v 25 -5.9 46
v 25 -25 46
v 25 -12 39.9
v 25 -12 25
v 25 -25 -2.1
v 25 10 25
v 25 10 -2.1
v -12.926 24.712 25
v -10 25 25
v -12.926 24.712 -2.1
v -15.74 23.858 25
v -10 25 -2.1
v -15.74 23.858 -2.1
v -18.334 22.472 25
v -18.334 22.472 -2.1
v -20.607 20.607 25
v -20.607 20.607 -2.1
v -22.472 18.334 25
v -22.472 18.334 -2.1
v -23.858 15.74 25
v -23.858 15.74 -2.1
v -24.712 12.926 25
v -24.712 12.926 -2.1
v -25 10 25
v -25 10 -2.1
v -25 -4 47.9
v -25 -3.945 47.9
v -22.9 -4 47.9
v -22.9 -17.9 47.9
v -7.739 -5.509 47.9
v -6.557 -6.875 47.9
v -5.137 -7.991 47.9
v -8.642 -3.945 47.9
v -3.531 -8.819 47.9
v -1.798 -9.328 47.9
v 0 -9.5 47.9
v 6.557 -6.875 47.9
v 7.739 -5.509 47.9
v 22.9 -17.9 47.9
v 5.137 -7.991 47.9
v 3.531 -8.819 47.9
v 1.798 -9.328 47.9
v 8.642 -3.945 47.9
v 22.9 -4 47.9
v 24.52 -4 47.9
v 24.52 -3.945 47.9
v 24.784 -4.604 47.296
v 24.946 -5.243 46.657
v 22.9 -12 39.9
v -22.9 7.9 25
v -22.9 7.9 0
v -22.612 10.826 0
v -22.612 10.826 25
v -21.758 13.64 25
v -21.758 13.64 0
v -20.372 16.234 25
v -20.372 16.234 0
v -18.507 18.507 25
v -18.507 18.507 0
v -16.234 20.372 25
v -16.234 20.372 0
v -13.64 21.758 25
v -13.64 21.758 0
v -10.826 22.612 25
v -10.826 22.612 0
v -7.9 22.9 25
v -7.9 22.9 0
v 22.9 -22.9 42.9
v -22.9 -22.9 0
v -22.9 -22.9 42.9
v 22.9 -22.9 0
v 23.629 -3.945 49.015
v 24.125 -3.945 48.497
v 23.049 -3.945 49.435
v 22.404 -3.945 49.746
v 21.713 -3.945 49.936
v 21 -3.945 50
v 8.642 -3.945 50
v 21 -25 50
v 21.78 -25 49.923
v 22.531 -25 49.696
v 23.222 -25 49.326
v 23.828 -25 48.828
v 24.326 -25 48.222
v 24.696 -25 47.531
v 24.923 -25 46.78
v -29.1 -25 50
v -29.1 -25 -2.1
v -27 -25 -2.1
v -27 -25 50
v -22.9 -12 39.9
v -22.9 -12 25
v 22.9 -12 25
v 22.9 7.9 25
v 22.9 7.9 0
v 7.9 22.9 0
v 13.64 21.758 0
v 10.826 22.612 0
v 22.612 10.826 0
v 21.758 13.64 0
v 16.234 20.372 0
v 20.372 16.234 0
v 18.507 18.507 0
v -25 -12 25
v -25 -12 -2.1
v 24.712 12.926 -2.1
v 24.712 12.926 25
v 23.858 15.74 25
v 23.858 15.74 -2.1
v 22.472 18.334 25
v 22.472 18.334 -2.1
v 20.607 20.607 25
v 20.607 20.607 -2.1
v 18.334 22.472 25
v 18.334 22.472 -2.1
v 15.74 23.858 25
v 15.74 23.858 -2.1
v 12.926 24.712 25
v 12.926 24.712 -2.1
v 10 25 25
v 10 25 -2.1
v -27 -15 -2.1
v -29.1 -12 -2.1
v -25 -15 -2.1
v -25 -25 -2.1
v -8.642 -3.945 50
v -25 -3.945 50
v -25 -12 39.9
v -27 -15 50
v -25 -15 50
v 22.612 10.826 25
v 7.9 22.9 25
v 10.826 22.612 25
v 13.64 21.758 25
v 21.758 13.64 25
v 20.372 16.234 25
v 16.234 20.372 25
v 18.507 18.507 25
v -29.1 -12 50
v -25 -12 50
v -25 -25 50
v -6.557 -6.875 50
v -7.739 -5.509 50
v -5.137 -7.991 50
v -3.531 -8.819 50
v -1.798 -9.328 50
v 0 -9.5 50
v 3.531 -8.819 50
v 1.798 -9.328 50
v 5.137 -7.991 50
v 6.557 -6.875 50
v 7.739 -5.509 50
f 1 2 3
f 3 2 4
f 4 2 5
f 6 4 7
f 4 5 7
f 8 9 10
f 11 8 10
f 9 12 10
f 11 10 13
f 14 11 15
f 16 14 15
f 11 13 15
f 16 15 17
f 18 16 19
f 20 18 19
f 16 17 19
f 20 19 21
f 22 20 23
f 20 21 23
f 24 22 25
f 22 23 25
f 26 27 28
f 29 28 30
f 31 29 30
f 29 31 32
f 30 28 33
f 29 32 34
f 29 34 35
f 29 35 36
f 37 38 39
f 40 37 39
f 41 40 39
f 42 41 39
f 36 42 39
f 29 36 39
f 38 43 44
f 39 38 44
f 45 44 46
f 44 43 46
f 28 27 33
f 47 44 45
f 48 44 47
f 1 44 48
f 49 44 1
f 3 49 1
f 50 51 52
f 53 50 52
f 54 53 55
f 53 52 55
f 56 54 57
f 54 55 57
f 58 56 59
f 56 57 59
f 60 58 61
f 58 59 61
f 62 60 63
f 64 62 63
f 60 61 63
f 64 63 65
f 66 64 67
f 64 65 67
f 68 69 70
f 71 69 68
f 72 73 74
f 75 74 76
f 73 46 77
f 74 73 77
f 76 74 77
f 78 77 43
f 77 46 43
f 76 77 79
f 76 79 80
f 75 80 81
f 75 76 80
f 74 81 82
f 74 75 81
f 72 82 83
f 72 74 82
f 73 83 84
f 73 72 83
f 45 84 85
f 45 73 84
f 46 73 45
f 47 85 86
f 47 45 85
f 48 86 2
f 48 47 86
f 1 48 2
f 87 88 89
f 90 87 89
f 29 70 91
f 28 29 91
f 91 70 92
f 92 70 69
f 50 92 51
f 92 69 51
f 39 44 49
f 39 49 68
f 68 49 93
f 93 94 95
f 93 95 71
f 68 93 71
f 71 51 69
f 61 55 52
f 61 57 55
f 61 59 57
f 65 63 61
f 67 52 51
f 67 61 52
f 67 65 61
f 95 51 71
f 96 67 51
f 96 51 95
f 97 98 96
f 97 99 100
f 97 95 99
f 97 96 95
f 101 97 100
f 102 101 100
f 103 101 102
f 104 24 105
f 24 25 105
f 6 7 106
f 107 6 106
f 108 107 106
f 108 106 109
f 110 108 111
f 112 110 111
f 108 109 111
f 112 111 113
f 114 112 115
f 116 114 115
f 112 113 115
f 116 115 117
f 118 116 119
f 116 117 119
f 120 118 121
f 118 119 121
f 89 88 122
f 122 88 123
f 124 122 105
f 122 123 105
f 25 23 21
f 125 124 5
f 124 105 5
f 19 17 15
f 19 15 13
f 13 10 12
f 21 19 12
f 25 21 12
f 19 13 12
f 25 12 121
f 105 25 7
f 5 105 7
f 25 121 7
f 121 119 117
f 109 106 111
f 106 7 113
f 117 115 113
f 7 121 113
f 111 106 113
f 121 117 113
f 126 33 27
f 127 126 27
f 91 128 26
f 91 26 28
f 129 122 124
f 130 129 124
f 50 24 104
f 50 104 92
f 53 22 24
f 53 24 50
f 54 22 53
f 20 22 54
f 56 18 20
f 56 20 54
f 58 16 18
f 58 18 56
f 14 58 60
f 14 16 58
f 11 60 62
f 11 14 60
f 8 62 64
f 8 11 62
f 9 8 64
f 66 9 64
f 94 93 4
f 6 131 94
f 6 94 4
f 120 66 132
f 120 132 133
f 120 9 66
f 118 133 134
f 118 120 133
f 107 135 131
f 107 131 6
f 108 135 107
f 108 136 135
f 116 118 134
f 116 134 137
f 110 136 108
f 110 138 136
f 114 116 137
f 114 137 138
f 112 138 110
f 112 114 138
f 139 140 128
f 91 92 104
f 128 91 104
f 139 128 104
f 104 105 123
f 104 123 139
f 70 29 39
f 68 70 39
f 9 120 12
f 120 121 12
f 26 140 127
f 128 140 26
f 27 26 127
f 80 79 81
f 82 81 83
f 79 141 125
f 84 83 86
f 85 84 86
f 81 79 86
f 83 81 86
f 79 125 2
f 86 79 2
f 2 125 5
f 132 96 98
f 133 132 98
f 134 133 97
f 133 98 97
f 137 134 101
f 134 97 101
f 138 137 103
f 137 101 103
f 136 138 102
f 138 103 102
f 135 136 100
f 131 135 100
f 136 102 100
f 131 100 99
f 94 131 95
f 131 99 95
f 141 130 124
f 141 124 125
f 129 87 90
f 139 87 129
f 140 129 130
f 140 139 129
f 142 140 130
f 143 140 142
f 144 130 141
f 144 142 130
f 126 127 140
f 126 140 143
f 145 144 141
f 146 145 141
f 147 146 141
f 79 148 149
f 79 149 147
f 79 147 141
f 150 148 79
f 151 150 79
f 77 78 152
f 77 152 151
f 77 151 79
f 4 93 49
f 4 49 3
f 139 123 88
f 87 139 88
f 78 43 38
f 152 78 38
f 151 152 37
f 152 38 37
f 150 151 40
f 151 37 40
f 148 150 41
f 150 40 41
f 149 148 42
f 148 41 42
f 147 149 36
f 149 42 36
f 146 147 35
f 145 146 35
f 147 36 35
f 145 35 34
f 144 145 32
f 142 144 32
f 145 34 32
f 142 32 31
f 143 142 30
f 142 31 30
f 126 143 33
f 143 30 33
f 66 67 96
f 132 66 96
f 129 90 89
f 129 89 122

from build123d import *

# Parameters (mm, degrees)
F0_W          = 2.1
F0_H          = 8.055364
F0_H_2        = 10.9
F1_DEPTH      = 2.1
F2_DEPTH      = 50
F2_DEPTH_BACK = 2.1
F3_DEPTH      = 47.9
F4_SIZE       = 5
F5_DEPTH      = 25
F6_SIZE       = 8
F7_R          = 4


with BuildPart() as f1:
    # F0 (on Top) → F1 (new body)
    with BuildSketch(Plane.XY):
        with BuildLine():
            Line((8.642329, -3.944636), (22.9, -3.944636))
            Line((22.9, -3.944636), (22.9, 7.9))
            ThreePointArc((22.9, 7.9), (18.506602, 18.506602), (7.9, 22.9))
            Line((7.9, 22.9), (-7.9, 22.9))
            ThreePointArc((-7.9, 22.9), (-18.506602, 18.506602), (-22.9, 7.9))
            Line((-22.9, 7.9), (-22.9, -3.944636))
            Line((-22.9, -3.944636), (-8.642329, -3.944636))
            ThreePointArc((-8.642329, -3.944636), (-2.0184, 9.283106), (9.5, 0))
            ThreePointArc((9.5, 0), (9.283106, -2.0184), (8.642329, -3.944636))
        make_face()
        with BuildLine():
            Line((-22.9, -22.9), (22.9, -22.9))
            Line((22.9, -22.9), (22.9, -12))
            Line((22.9, -12), (22.9, -3.944636))
            Line((22.9, -3.944636), (8.642329, -3.944636))
            ThreePointArc((8.642329, -3.944636), (0, -9.5), (-8.642329, -3.944636))
            Line((-8.642329, -3.944636), (-22.9, -3.944636))
            Line((-22.9, -3.944636), (-22.9, -12))
            Line((-22.9, -12), (-22.9, -22.9))
        make_face()
        with BuildLine():
            ThreePointArc((-8.642329, -3.944636), (0, -9.5), (8.642329, -3.944636))
            Line((8.642329, -3.944636), (-8.642329, -3.944636))
        make_face()
        with BuildLine():
            Line((22.9, -3.944636), (25, -3.944636))
            Line((25, -3.944636), (25, 10))
            ThreePointArc((25, 10), (20.606602, 20.606602), (10, 25))
            Line((10, 25), (-10, 25))
            ThreePointArc((-10, 25), (-20.606602, 20.606602), (-25, 10))
            Line((-25, 10), (-25, -3.944636))
            Line((-25, -3.944636), (-22.9, -3.944636))
            Line((-22.9, -3.944636), (-22.9, 7.9))
            ThreePointArc((-22.9, 7.9), (-18.506602, 18.506602), (-7.9, 22.9))
            Line((-7.9, 22.9), (7.9, 22.9))
            ThreePointArc((7.9, 22.9), (18.506602, 18.506602), (22.9, 7.9))
            Line((22.9, 7.9), (22.9, -3.944636))
        make_face()
        with BuildLine():
            Line((-8.642329, -3.944636), (8.642329, -3.944636))
            ThreePointArc((8.642329, -3.944636), (9.283106, -2.0184), (9.5, 0))
            ThreePointArc((9.5, 0), (-2.0184, 9.283106), (-8.642329, -3.944636))
        make_face()
        Polygon((-25, -15), (-25, -22.9), (-22.9, -22.9), (-22.9, -12), (-25, -12), (-29.1, -12), (-29.1, -25), (-27, -25), (-27, -15), align=None)
        Polygon((-25, -25), (25, -25), (25, -22.9), (22.9, -22.9), (-22.9, -22.9), (-25, -22.9), align=None)
        with Locations((-23.95, -7.972318)):
            Rectangle(F0_W, F0_H)
        with Locations((23.95, -7.972318)):
            Rectangle(F0_W, F0_H)
        with Locations((23.95, -17.45)):
            Rectangle(F0_W, F0_H_2)
    extrude(amount=-F1_DEPTH)

    # F0 (on Top) → F2 (join, two sides)
    with BuildSketch(Plane.XY) as f2_sk:
        with BuildLine():
            Line((-22.9, -22.9), (22.9, -22.9))
            Line((22.9, -22.9), (22.9, -12))
            Line((22.9, -12), (22.9, -3.944636))
            Line((22.9, -3.944636), (8.642329, -3.944636))
            ThreePointArc((8.642329, -3.944636), (0, -9.5), (-8.642329, -3.944636))
            Line((-8.642329, -3.944636), (-22.9, -3.944636))
            Line((-22.9, -3.944636), (-22.9, -12))
            Line((-22.9, -12), (-22.9, -22.9))
        make_face()
        Polygon((-25, -15), (-25, -22.9), (-22.9, -22.9), (-22.9, -12), (-25, -12), (-29.1, -12), (-29.1, -25), (-27, -25), (-27, -15), align=None)
        Polygon((-25, -25), (25, -25), (25, -22.9), (22.9, -22.9), (-22.9, -22.9), (-25, -22.9), align=None)
        with Locations((23.95, -17.45)):
            Rectangle(F0_W, F0_H_2)
        with Locations((-23.95, -7.972318)):
            Rectangle(F0_W, F0_H)
        with Locations((23.95, -7.972318)):
            Rectangle(F0_W, F0_H)
    extrude(amount=F2_DEPTH)
    extrude(f2_sk.sketch, amount=-F2_DEPTH_BACK)

    # F0 (on Top) → F3 (cut)
    with BuildSketch(Plane.XY):
        with BuildLine():
            Line((-22.9, -22.9), (22.9, -22.9))
            Line((22.9, -22.9), (22.9, -12))
            Line((22.9, -12), (22.9, -3.944636))
            Line((22.9, -3.944636), (8.642329, -3.944636))
            ThreePointArc((8.642329, -3.944636), (0, -9.5), (-8.642329, -3.944636))
            Line((-8.642329, -3.944636), (-22.9, -3.944636))
            Line((-22.9, -3.944636), (-22.9, -12))
            Line((-22.9, -12), (-22.9, -22.9))
        make_face()
        with Locations((-23.95, -7.972318)):
            Rectangle(F0_W, F0_H)
        with Locations((23.95, -7.972318)):
            Rectangle(F0_W, F0_H)
    extrude(amount=F3_DEPTH, mode=Mode.SUBTRACT)

    # F4
    f4_edges = [f1.edges().sort_by_distance(p)[0] for p in [
        (0, -22.9, 47.9),
    ]]
    chamfer(f4_edges, length=F4_SIZE)

    # F0 (on Top) → F5 (join)
    with BuildSketch(Plane.XY):
        with BuildLine():
            Line((22.9, -3.944636), (25, -3.944636))
            Line((25, -3.944636), (25, 10))
            ThreePointArc((25, 10), (20.606602, 20.606602), (10, 25))
            Line((10, 25), (-10, 25))
            ThreePointArc((-10, 25), (-20.606602, 20.606602), (-25, 10))
            Line((-25, 10), (-25, -3.944636))
            Line((-25, -3.944636), (-22.9, -3.944636))
            Line((-22.9, -3.944636), (-22.9, 7.9))
            ThreePointArc((-22.9, 7.9), (-18.506602, 18.506602), (-7.9, 22.9))
            Line((-7.9, 22.9), (7.9, 22.9))
            ThreePointArc((7.9, 22.9), (18.506602, 18.506602), (22.9, 7.9))
            Line((22.9, 7.9), (22.9, -3.944636))
        make_face()
        with Locations((-23.95, -7.972318)):
            Rectangle(F0_W, F0_H)
        with Locations((23.95, -7.972318)):
            Rectangle(F0_W, F0_H)
    extrude(amount=F5_DEPTH)

    # F6
    f6_edges = [f1.edges().sort_by_distance(p)[0] for p in [
        (23.95, -12, 47.9),
        (-23.95, -12, 47.9),
    ]]
    chamfer(f6_edges, length=F6_SIZE)

    # F7
    f7_edges = [f1.edges().sort_by_distance(p)[0] for p in [
        (25, -14.472318, 50),
    ]]
    fillet(f7_edges, radius=F7_R)


solid = f1.part
